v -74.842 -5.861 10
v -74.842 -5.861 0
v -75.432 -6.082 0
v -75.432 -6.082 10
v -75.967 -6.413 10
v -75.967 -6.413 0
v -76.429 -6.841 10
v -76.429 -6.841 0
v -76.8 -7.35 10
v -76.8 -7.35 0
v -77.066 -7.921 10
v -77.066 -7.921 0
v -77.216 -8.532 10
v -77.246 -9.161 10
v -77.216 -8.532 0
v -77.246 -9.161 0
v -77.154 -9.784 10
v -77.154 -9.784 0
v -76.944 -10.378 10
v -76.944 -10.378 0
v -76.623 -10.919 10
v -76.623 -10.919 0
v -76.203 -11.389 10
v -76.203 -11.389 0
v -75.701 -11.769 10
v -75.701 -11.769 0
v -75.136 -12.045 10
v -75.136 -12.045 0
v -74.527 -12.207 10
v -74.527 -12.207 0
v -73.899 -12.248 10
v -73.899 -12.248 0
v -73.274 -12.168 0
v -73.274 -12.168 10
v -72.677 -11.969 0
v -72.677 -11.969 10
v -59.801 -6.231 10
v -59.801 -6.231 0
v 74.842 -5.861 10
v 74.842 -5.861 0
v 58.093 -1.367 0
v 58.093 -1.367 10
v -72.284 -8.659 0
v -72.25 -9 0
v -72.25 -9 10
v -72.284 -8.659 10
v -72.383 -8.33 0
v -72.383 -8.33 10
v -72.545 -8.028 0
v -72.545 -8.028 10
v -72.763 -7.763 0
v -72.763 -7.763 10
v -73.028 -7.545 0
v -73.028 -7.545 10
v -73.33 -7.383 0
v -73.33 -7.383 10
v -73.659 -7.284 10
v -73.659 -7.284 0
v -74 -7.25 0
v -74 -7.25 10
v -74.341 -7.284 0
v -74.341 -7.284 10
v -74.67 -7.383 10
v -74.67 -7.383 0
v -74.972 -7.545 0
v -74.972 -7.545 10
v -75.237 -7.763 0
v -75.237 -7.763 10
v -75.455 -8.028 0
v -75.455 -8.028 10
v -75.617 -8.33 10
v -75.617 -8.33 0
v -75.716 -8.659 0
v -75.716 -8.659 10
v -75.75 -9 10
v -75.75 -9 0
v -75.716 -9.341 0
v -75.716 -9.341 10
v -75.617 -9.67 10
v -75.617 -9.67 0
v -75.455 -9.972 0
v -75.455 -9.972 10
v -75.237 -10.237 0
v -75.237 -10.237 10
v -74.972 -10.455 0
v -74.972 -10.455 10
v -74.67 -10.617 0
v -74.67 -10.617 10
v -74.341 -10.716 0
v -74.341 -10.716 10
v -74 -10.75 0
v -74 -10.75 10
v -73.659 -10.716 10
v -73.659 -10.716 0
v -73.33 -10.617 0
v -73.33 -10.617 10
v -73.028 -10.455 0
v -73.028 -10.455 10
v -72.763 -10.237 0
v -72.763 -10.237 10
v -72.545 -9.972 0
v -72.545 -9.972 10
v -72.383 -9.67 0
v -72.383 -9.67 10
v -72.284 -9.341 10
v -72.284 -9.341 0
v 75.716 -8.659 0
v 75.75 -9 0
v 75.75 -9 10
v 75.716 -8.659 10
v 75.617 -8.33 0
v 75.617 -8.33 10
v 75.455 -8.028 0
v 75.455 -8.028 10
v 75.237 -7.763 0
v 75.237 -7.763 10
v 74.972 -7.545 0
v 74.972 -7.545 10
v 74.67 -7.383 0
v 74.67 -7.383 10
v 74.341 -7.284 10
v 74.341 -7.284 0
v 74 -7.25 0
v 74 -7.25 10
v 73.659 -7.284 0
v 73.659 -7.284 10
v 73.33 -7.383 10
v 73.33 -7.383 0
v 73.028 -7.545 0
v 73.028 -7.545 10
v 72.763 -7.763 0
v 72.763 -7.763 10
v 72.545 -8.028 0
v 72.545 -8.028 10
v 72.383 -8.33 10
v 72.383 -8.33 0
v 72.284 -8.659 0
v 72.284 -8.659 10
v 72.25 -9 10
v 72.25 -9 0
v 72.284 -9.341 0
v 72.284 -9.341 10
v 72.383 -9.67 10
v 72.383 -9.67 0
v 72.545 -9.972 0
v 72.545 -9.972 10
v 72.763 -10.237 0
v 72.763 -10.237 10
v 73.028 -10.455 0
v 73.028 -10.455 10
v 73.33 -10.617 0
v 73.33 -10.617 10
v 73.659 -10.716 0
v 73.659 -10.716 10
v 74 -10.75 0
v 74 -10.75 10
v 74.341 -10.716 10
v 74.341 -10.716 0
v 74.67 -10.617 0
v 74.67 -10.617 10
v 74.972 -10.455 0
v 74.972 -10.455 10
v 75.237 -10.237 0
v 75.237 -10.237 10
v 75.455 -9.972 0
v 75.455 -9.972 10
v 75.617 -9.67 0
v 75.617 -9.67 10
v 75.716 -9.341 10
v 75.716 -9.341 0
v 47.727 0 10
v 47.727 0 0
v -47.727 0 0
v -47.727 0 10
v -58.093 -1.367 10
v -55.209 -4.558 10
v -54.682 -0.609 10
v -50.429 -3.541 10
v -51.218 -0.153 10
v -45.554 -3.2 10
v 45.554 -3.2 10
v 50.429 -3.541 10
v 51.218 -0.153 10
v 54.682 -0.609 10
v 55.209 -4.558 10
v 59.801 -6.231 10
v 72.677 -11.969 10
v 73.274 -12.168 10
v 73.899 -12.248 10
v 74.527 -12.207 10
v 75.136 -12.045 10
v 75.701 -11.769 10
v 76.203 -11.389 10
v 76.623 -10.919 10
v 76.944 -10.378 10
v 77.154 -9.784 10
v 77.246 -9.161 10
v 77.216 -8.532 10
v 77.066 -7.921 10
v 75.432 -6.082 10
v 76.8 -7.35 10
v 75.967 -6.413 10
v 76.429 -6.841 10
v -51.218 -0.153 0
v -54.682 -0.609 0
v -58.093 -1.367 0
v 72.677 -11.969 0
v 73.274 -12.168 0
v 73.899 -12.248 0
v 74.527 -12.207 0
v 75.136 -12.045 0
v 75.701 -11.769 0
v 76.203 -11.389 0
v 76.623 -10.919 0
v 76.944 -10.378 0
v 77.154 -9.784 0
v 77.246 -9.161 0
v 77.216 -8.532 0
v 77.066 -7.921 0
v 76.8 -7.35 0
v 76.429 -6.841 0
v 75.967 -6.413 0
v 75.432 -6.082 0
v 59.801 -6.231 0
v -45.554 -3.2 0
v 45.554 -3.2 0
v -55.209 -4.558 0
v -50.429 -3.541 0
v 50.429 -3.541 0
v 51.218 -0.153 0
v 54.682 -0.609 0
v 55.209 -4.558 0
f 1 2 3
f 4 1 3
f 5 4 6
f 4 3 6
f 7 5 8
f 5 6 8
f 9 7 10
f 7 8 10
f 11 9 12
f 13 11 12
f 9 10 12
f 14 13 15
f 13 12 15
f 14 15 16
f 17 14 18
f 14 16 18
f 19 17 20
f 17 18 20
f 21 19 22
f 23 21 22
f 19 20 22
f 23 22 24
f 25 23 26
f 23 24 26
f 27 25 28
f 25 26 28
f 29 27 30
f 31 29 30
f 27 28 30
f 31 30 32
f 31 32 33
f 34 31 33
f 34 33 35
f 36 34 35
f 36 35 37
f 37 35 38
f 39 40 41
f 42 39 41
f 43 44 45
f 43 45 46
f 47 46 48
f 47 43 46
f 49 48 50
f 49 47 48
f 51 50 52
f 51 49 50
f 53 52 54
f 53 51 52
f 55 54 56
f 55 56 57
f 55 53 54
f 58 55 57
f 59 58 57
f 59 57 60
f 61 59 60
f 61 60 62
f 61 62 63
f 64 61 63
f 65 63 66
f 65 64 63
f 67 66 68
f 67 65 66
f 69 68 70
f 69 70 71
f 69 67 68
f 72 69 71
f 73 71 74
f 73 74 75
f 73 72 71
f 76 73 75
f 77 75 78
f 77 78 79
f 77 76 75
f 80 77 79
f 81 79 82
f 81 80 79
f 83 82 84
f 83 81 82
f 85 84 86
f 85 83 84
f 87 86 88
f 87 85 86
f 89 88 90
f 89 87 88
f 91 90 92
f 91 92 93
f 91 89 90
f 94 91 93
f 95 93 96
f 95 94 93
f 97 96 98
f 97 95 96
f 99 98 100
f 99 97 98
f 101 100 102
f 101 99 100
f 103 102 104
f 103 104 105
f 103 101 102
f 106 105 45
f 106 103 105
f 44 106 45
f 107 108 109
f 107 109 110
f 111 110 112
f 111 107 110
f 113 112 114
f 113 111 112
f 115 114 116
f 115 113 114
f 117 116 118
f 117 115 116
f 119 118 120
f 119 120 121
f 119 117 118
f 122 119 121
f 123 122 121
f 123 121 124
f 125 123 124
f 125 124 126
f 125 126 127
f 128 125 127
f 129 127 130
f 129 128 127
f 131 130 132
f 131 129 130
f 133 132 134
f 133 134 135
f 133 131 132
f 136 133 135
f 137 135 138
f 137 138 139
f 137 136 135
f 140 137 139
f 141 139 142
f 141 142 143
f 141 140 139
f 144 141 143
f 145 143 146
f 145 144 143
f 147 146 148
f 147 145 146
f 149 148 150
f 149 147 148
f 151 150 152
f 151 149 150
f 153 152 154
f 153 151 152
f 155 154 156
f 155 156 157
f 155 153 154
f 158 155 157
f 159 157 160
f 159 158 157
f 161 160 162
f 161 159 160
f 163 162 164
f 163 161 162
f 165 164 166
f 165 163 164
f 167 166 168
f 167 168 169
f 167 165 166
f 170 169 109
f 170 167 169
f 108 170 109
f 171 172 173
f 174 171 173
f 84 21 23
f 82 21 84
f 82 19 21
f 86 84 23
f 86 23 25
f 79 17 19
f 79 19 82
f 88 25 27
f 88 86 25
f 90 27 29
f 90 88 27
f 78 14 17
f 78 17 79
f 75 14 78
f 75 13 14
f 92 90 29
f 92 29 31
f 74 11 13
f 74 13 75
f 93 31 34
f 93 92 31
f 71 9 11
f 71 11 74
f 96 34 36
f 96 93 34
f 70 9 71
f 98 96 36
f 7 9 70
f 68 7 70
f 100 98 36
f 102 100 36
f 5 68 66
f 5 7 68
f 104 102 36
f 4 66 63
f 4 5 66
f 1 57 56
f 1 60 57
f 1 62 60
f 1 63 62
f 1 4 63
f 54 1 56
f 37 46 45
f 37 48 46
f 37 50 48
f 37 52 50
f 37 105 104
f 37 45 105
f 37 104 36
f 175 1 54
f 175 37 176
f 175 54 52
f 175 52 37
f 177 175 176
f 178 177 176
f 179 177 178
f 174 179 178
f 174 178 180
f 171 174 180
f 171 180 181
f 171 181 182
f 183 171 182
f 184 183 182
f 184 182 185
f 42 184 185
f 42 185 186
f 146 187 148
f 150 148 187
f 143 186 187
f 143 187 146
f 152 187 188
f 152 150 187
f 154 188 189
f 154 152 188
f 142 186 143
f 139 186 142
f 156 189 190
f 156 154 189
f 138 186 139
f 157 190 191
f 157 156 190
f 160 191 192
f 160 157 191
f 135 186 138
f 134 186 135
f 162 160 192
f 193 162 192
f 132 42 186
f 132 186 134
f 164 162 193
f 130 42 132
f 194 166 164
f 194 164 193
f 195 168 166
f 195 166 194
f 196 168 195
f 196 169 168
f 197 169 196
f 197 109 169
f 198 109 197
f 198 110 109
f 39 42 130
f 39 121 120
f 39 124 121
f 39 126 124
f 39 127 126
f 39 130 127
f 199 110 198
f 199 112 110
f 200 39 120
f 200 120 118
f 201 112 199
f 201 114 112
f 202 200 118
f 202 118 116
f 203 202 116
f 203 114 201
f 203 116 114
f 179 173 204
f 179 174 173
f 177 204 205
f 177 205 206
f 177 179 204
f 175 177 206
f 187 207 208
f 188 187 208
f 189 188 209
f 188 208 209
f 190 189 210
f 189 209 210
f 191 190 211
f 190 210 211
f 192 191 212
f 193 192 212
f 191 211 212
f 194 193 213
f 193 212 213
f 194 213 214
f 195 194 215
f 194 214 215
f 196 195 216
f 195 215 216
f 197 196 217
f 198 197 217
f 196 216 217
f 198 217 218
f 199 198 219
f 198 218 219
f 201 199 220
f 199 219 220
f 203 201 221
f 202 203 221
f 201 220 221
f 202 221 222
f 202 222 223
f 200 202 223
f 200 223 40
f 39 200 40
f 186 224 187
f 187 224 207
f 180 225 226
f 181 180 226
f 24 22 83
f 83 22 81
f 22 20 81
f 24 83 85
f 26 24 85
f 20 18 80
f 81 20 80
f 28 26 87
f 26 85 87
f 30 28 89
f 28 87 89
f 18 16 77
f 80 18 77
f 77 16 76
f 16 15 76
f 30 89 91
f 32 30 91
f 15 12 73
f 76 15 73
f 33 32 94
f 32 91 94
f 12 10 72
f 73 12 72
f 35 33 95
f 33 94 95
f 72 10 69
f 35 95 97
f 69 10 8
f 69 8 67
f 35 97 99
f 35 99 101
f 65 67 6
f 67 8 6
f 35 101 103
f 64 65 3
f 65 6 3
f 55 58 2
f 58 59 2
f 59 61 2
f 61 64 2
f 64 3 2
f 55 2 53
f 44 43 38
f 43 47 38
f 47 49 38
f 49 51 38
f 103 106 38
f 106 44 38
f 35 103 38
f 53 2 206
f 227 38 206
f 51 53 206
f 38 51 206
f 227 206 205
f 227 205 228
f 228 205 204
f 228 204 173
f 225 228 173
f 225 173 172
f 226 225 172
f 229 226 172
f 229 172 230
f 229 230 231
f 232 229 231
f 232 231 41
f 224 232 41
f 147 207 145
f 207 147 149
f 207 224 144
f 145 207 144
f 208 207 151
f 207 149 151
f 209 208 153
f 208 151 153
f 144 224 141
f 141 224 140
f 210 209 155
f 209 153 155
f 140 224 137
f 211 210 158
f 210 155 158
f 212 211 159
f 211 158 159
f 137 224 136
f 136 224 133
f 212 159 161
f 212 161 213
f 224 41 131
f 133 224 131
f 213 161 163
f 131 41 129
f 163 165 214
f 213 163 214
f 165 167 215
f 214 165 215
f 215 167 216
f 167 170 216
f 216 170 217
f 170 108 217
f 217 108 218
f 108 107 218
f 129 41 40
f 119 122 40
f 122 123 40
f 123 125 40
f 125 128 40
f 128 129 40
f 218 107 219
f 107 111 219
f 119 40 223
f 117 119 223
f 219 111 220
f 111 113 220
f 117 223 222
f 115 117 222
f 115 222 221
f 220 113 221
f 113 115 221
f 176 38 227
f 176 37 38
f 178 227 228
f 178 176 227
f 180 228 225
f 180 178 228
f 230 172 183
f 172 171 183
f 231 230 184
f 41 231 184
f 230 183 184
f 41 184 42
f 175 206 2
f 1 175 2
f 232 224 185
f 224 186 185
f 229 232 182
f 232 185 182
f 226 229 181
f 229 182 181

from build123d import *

# Parameters (mm, degrees)
F0_R     = 1.75
F1_DEPTH = 10
F2_R     = 40
F3_R     = 35


with BuildPart() as f1:
    # F0 (on Top) → F1 (new body)
    with BuildSketch(Plane.XY):
        with BuildLine():
            Line((53, 0), (0, 0))
            Line((0, 0), (-53, 0))
            Line((-53, 0), (-74.842291, -5.861044))
            ThreePointArc((-74.842291, -5.861044), (-77.063211, -10.085928), (-72.677128, -11.968587))
            Line((-72.677128, -11.968587), (-53, -3.2))
            Line((-53, -3.2), (0, -3.2))
            Line((0, -3.2), (53, -3.2))
            Line((53, -3.2), (72.677128, -11.968587))
            ThreePointArc((72.677128, -11.968587), (77.063211, -10.085928), (74.842291, -5.861044))
            Line((74.842291, -5.861044), (53, 0))
        make_face()
        with Locations((-74, -9)):
            Circle(F0_R, mode=Mode.SUBTRACT)
        with Locations((74, -9)):
            Circle(F0_R, mode=Mode.SUBTRACT)
    extrude(amount=F1_DEPTH)

    # F2
    f2_edges = [f1.edges().sort_by_distance(p)[0] for p in [
        (53, 0, 5),
        (-53, 0, 5),
    ]]
    fillet(f2_edges, radius=F2_R)

    # F3
    f3_edges = [f1.edges().sort_by_distance(p)[0] for p in [
        (-53, -3.2, 5),
        (53, -3.2, 5),
    ]]
    fillet(f3_edges, radius=F3_R)


solid = f1.part
